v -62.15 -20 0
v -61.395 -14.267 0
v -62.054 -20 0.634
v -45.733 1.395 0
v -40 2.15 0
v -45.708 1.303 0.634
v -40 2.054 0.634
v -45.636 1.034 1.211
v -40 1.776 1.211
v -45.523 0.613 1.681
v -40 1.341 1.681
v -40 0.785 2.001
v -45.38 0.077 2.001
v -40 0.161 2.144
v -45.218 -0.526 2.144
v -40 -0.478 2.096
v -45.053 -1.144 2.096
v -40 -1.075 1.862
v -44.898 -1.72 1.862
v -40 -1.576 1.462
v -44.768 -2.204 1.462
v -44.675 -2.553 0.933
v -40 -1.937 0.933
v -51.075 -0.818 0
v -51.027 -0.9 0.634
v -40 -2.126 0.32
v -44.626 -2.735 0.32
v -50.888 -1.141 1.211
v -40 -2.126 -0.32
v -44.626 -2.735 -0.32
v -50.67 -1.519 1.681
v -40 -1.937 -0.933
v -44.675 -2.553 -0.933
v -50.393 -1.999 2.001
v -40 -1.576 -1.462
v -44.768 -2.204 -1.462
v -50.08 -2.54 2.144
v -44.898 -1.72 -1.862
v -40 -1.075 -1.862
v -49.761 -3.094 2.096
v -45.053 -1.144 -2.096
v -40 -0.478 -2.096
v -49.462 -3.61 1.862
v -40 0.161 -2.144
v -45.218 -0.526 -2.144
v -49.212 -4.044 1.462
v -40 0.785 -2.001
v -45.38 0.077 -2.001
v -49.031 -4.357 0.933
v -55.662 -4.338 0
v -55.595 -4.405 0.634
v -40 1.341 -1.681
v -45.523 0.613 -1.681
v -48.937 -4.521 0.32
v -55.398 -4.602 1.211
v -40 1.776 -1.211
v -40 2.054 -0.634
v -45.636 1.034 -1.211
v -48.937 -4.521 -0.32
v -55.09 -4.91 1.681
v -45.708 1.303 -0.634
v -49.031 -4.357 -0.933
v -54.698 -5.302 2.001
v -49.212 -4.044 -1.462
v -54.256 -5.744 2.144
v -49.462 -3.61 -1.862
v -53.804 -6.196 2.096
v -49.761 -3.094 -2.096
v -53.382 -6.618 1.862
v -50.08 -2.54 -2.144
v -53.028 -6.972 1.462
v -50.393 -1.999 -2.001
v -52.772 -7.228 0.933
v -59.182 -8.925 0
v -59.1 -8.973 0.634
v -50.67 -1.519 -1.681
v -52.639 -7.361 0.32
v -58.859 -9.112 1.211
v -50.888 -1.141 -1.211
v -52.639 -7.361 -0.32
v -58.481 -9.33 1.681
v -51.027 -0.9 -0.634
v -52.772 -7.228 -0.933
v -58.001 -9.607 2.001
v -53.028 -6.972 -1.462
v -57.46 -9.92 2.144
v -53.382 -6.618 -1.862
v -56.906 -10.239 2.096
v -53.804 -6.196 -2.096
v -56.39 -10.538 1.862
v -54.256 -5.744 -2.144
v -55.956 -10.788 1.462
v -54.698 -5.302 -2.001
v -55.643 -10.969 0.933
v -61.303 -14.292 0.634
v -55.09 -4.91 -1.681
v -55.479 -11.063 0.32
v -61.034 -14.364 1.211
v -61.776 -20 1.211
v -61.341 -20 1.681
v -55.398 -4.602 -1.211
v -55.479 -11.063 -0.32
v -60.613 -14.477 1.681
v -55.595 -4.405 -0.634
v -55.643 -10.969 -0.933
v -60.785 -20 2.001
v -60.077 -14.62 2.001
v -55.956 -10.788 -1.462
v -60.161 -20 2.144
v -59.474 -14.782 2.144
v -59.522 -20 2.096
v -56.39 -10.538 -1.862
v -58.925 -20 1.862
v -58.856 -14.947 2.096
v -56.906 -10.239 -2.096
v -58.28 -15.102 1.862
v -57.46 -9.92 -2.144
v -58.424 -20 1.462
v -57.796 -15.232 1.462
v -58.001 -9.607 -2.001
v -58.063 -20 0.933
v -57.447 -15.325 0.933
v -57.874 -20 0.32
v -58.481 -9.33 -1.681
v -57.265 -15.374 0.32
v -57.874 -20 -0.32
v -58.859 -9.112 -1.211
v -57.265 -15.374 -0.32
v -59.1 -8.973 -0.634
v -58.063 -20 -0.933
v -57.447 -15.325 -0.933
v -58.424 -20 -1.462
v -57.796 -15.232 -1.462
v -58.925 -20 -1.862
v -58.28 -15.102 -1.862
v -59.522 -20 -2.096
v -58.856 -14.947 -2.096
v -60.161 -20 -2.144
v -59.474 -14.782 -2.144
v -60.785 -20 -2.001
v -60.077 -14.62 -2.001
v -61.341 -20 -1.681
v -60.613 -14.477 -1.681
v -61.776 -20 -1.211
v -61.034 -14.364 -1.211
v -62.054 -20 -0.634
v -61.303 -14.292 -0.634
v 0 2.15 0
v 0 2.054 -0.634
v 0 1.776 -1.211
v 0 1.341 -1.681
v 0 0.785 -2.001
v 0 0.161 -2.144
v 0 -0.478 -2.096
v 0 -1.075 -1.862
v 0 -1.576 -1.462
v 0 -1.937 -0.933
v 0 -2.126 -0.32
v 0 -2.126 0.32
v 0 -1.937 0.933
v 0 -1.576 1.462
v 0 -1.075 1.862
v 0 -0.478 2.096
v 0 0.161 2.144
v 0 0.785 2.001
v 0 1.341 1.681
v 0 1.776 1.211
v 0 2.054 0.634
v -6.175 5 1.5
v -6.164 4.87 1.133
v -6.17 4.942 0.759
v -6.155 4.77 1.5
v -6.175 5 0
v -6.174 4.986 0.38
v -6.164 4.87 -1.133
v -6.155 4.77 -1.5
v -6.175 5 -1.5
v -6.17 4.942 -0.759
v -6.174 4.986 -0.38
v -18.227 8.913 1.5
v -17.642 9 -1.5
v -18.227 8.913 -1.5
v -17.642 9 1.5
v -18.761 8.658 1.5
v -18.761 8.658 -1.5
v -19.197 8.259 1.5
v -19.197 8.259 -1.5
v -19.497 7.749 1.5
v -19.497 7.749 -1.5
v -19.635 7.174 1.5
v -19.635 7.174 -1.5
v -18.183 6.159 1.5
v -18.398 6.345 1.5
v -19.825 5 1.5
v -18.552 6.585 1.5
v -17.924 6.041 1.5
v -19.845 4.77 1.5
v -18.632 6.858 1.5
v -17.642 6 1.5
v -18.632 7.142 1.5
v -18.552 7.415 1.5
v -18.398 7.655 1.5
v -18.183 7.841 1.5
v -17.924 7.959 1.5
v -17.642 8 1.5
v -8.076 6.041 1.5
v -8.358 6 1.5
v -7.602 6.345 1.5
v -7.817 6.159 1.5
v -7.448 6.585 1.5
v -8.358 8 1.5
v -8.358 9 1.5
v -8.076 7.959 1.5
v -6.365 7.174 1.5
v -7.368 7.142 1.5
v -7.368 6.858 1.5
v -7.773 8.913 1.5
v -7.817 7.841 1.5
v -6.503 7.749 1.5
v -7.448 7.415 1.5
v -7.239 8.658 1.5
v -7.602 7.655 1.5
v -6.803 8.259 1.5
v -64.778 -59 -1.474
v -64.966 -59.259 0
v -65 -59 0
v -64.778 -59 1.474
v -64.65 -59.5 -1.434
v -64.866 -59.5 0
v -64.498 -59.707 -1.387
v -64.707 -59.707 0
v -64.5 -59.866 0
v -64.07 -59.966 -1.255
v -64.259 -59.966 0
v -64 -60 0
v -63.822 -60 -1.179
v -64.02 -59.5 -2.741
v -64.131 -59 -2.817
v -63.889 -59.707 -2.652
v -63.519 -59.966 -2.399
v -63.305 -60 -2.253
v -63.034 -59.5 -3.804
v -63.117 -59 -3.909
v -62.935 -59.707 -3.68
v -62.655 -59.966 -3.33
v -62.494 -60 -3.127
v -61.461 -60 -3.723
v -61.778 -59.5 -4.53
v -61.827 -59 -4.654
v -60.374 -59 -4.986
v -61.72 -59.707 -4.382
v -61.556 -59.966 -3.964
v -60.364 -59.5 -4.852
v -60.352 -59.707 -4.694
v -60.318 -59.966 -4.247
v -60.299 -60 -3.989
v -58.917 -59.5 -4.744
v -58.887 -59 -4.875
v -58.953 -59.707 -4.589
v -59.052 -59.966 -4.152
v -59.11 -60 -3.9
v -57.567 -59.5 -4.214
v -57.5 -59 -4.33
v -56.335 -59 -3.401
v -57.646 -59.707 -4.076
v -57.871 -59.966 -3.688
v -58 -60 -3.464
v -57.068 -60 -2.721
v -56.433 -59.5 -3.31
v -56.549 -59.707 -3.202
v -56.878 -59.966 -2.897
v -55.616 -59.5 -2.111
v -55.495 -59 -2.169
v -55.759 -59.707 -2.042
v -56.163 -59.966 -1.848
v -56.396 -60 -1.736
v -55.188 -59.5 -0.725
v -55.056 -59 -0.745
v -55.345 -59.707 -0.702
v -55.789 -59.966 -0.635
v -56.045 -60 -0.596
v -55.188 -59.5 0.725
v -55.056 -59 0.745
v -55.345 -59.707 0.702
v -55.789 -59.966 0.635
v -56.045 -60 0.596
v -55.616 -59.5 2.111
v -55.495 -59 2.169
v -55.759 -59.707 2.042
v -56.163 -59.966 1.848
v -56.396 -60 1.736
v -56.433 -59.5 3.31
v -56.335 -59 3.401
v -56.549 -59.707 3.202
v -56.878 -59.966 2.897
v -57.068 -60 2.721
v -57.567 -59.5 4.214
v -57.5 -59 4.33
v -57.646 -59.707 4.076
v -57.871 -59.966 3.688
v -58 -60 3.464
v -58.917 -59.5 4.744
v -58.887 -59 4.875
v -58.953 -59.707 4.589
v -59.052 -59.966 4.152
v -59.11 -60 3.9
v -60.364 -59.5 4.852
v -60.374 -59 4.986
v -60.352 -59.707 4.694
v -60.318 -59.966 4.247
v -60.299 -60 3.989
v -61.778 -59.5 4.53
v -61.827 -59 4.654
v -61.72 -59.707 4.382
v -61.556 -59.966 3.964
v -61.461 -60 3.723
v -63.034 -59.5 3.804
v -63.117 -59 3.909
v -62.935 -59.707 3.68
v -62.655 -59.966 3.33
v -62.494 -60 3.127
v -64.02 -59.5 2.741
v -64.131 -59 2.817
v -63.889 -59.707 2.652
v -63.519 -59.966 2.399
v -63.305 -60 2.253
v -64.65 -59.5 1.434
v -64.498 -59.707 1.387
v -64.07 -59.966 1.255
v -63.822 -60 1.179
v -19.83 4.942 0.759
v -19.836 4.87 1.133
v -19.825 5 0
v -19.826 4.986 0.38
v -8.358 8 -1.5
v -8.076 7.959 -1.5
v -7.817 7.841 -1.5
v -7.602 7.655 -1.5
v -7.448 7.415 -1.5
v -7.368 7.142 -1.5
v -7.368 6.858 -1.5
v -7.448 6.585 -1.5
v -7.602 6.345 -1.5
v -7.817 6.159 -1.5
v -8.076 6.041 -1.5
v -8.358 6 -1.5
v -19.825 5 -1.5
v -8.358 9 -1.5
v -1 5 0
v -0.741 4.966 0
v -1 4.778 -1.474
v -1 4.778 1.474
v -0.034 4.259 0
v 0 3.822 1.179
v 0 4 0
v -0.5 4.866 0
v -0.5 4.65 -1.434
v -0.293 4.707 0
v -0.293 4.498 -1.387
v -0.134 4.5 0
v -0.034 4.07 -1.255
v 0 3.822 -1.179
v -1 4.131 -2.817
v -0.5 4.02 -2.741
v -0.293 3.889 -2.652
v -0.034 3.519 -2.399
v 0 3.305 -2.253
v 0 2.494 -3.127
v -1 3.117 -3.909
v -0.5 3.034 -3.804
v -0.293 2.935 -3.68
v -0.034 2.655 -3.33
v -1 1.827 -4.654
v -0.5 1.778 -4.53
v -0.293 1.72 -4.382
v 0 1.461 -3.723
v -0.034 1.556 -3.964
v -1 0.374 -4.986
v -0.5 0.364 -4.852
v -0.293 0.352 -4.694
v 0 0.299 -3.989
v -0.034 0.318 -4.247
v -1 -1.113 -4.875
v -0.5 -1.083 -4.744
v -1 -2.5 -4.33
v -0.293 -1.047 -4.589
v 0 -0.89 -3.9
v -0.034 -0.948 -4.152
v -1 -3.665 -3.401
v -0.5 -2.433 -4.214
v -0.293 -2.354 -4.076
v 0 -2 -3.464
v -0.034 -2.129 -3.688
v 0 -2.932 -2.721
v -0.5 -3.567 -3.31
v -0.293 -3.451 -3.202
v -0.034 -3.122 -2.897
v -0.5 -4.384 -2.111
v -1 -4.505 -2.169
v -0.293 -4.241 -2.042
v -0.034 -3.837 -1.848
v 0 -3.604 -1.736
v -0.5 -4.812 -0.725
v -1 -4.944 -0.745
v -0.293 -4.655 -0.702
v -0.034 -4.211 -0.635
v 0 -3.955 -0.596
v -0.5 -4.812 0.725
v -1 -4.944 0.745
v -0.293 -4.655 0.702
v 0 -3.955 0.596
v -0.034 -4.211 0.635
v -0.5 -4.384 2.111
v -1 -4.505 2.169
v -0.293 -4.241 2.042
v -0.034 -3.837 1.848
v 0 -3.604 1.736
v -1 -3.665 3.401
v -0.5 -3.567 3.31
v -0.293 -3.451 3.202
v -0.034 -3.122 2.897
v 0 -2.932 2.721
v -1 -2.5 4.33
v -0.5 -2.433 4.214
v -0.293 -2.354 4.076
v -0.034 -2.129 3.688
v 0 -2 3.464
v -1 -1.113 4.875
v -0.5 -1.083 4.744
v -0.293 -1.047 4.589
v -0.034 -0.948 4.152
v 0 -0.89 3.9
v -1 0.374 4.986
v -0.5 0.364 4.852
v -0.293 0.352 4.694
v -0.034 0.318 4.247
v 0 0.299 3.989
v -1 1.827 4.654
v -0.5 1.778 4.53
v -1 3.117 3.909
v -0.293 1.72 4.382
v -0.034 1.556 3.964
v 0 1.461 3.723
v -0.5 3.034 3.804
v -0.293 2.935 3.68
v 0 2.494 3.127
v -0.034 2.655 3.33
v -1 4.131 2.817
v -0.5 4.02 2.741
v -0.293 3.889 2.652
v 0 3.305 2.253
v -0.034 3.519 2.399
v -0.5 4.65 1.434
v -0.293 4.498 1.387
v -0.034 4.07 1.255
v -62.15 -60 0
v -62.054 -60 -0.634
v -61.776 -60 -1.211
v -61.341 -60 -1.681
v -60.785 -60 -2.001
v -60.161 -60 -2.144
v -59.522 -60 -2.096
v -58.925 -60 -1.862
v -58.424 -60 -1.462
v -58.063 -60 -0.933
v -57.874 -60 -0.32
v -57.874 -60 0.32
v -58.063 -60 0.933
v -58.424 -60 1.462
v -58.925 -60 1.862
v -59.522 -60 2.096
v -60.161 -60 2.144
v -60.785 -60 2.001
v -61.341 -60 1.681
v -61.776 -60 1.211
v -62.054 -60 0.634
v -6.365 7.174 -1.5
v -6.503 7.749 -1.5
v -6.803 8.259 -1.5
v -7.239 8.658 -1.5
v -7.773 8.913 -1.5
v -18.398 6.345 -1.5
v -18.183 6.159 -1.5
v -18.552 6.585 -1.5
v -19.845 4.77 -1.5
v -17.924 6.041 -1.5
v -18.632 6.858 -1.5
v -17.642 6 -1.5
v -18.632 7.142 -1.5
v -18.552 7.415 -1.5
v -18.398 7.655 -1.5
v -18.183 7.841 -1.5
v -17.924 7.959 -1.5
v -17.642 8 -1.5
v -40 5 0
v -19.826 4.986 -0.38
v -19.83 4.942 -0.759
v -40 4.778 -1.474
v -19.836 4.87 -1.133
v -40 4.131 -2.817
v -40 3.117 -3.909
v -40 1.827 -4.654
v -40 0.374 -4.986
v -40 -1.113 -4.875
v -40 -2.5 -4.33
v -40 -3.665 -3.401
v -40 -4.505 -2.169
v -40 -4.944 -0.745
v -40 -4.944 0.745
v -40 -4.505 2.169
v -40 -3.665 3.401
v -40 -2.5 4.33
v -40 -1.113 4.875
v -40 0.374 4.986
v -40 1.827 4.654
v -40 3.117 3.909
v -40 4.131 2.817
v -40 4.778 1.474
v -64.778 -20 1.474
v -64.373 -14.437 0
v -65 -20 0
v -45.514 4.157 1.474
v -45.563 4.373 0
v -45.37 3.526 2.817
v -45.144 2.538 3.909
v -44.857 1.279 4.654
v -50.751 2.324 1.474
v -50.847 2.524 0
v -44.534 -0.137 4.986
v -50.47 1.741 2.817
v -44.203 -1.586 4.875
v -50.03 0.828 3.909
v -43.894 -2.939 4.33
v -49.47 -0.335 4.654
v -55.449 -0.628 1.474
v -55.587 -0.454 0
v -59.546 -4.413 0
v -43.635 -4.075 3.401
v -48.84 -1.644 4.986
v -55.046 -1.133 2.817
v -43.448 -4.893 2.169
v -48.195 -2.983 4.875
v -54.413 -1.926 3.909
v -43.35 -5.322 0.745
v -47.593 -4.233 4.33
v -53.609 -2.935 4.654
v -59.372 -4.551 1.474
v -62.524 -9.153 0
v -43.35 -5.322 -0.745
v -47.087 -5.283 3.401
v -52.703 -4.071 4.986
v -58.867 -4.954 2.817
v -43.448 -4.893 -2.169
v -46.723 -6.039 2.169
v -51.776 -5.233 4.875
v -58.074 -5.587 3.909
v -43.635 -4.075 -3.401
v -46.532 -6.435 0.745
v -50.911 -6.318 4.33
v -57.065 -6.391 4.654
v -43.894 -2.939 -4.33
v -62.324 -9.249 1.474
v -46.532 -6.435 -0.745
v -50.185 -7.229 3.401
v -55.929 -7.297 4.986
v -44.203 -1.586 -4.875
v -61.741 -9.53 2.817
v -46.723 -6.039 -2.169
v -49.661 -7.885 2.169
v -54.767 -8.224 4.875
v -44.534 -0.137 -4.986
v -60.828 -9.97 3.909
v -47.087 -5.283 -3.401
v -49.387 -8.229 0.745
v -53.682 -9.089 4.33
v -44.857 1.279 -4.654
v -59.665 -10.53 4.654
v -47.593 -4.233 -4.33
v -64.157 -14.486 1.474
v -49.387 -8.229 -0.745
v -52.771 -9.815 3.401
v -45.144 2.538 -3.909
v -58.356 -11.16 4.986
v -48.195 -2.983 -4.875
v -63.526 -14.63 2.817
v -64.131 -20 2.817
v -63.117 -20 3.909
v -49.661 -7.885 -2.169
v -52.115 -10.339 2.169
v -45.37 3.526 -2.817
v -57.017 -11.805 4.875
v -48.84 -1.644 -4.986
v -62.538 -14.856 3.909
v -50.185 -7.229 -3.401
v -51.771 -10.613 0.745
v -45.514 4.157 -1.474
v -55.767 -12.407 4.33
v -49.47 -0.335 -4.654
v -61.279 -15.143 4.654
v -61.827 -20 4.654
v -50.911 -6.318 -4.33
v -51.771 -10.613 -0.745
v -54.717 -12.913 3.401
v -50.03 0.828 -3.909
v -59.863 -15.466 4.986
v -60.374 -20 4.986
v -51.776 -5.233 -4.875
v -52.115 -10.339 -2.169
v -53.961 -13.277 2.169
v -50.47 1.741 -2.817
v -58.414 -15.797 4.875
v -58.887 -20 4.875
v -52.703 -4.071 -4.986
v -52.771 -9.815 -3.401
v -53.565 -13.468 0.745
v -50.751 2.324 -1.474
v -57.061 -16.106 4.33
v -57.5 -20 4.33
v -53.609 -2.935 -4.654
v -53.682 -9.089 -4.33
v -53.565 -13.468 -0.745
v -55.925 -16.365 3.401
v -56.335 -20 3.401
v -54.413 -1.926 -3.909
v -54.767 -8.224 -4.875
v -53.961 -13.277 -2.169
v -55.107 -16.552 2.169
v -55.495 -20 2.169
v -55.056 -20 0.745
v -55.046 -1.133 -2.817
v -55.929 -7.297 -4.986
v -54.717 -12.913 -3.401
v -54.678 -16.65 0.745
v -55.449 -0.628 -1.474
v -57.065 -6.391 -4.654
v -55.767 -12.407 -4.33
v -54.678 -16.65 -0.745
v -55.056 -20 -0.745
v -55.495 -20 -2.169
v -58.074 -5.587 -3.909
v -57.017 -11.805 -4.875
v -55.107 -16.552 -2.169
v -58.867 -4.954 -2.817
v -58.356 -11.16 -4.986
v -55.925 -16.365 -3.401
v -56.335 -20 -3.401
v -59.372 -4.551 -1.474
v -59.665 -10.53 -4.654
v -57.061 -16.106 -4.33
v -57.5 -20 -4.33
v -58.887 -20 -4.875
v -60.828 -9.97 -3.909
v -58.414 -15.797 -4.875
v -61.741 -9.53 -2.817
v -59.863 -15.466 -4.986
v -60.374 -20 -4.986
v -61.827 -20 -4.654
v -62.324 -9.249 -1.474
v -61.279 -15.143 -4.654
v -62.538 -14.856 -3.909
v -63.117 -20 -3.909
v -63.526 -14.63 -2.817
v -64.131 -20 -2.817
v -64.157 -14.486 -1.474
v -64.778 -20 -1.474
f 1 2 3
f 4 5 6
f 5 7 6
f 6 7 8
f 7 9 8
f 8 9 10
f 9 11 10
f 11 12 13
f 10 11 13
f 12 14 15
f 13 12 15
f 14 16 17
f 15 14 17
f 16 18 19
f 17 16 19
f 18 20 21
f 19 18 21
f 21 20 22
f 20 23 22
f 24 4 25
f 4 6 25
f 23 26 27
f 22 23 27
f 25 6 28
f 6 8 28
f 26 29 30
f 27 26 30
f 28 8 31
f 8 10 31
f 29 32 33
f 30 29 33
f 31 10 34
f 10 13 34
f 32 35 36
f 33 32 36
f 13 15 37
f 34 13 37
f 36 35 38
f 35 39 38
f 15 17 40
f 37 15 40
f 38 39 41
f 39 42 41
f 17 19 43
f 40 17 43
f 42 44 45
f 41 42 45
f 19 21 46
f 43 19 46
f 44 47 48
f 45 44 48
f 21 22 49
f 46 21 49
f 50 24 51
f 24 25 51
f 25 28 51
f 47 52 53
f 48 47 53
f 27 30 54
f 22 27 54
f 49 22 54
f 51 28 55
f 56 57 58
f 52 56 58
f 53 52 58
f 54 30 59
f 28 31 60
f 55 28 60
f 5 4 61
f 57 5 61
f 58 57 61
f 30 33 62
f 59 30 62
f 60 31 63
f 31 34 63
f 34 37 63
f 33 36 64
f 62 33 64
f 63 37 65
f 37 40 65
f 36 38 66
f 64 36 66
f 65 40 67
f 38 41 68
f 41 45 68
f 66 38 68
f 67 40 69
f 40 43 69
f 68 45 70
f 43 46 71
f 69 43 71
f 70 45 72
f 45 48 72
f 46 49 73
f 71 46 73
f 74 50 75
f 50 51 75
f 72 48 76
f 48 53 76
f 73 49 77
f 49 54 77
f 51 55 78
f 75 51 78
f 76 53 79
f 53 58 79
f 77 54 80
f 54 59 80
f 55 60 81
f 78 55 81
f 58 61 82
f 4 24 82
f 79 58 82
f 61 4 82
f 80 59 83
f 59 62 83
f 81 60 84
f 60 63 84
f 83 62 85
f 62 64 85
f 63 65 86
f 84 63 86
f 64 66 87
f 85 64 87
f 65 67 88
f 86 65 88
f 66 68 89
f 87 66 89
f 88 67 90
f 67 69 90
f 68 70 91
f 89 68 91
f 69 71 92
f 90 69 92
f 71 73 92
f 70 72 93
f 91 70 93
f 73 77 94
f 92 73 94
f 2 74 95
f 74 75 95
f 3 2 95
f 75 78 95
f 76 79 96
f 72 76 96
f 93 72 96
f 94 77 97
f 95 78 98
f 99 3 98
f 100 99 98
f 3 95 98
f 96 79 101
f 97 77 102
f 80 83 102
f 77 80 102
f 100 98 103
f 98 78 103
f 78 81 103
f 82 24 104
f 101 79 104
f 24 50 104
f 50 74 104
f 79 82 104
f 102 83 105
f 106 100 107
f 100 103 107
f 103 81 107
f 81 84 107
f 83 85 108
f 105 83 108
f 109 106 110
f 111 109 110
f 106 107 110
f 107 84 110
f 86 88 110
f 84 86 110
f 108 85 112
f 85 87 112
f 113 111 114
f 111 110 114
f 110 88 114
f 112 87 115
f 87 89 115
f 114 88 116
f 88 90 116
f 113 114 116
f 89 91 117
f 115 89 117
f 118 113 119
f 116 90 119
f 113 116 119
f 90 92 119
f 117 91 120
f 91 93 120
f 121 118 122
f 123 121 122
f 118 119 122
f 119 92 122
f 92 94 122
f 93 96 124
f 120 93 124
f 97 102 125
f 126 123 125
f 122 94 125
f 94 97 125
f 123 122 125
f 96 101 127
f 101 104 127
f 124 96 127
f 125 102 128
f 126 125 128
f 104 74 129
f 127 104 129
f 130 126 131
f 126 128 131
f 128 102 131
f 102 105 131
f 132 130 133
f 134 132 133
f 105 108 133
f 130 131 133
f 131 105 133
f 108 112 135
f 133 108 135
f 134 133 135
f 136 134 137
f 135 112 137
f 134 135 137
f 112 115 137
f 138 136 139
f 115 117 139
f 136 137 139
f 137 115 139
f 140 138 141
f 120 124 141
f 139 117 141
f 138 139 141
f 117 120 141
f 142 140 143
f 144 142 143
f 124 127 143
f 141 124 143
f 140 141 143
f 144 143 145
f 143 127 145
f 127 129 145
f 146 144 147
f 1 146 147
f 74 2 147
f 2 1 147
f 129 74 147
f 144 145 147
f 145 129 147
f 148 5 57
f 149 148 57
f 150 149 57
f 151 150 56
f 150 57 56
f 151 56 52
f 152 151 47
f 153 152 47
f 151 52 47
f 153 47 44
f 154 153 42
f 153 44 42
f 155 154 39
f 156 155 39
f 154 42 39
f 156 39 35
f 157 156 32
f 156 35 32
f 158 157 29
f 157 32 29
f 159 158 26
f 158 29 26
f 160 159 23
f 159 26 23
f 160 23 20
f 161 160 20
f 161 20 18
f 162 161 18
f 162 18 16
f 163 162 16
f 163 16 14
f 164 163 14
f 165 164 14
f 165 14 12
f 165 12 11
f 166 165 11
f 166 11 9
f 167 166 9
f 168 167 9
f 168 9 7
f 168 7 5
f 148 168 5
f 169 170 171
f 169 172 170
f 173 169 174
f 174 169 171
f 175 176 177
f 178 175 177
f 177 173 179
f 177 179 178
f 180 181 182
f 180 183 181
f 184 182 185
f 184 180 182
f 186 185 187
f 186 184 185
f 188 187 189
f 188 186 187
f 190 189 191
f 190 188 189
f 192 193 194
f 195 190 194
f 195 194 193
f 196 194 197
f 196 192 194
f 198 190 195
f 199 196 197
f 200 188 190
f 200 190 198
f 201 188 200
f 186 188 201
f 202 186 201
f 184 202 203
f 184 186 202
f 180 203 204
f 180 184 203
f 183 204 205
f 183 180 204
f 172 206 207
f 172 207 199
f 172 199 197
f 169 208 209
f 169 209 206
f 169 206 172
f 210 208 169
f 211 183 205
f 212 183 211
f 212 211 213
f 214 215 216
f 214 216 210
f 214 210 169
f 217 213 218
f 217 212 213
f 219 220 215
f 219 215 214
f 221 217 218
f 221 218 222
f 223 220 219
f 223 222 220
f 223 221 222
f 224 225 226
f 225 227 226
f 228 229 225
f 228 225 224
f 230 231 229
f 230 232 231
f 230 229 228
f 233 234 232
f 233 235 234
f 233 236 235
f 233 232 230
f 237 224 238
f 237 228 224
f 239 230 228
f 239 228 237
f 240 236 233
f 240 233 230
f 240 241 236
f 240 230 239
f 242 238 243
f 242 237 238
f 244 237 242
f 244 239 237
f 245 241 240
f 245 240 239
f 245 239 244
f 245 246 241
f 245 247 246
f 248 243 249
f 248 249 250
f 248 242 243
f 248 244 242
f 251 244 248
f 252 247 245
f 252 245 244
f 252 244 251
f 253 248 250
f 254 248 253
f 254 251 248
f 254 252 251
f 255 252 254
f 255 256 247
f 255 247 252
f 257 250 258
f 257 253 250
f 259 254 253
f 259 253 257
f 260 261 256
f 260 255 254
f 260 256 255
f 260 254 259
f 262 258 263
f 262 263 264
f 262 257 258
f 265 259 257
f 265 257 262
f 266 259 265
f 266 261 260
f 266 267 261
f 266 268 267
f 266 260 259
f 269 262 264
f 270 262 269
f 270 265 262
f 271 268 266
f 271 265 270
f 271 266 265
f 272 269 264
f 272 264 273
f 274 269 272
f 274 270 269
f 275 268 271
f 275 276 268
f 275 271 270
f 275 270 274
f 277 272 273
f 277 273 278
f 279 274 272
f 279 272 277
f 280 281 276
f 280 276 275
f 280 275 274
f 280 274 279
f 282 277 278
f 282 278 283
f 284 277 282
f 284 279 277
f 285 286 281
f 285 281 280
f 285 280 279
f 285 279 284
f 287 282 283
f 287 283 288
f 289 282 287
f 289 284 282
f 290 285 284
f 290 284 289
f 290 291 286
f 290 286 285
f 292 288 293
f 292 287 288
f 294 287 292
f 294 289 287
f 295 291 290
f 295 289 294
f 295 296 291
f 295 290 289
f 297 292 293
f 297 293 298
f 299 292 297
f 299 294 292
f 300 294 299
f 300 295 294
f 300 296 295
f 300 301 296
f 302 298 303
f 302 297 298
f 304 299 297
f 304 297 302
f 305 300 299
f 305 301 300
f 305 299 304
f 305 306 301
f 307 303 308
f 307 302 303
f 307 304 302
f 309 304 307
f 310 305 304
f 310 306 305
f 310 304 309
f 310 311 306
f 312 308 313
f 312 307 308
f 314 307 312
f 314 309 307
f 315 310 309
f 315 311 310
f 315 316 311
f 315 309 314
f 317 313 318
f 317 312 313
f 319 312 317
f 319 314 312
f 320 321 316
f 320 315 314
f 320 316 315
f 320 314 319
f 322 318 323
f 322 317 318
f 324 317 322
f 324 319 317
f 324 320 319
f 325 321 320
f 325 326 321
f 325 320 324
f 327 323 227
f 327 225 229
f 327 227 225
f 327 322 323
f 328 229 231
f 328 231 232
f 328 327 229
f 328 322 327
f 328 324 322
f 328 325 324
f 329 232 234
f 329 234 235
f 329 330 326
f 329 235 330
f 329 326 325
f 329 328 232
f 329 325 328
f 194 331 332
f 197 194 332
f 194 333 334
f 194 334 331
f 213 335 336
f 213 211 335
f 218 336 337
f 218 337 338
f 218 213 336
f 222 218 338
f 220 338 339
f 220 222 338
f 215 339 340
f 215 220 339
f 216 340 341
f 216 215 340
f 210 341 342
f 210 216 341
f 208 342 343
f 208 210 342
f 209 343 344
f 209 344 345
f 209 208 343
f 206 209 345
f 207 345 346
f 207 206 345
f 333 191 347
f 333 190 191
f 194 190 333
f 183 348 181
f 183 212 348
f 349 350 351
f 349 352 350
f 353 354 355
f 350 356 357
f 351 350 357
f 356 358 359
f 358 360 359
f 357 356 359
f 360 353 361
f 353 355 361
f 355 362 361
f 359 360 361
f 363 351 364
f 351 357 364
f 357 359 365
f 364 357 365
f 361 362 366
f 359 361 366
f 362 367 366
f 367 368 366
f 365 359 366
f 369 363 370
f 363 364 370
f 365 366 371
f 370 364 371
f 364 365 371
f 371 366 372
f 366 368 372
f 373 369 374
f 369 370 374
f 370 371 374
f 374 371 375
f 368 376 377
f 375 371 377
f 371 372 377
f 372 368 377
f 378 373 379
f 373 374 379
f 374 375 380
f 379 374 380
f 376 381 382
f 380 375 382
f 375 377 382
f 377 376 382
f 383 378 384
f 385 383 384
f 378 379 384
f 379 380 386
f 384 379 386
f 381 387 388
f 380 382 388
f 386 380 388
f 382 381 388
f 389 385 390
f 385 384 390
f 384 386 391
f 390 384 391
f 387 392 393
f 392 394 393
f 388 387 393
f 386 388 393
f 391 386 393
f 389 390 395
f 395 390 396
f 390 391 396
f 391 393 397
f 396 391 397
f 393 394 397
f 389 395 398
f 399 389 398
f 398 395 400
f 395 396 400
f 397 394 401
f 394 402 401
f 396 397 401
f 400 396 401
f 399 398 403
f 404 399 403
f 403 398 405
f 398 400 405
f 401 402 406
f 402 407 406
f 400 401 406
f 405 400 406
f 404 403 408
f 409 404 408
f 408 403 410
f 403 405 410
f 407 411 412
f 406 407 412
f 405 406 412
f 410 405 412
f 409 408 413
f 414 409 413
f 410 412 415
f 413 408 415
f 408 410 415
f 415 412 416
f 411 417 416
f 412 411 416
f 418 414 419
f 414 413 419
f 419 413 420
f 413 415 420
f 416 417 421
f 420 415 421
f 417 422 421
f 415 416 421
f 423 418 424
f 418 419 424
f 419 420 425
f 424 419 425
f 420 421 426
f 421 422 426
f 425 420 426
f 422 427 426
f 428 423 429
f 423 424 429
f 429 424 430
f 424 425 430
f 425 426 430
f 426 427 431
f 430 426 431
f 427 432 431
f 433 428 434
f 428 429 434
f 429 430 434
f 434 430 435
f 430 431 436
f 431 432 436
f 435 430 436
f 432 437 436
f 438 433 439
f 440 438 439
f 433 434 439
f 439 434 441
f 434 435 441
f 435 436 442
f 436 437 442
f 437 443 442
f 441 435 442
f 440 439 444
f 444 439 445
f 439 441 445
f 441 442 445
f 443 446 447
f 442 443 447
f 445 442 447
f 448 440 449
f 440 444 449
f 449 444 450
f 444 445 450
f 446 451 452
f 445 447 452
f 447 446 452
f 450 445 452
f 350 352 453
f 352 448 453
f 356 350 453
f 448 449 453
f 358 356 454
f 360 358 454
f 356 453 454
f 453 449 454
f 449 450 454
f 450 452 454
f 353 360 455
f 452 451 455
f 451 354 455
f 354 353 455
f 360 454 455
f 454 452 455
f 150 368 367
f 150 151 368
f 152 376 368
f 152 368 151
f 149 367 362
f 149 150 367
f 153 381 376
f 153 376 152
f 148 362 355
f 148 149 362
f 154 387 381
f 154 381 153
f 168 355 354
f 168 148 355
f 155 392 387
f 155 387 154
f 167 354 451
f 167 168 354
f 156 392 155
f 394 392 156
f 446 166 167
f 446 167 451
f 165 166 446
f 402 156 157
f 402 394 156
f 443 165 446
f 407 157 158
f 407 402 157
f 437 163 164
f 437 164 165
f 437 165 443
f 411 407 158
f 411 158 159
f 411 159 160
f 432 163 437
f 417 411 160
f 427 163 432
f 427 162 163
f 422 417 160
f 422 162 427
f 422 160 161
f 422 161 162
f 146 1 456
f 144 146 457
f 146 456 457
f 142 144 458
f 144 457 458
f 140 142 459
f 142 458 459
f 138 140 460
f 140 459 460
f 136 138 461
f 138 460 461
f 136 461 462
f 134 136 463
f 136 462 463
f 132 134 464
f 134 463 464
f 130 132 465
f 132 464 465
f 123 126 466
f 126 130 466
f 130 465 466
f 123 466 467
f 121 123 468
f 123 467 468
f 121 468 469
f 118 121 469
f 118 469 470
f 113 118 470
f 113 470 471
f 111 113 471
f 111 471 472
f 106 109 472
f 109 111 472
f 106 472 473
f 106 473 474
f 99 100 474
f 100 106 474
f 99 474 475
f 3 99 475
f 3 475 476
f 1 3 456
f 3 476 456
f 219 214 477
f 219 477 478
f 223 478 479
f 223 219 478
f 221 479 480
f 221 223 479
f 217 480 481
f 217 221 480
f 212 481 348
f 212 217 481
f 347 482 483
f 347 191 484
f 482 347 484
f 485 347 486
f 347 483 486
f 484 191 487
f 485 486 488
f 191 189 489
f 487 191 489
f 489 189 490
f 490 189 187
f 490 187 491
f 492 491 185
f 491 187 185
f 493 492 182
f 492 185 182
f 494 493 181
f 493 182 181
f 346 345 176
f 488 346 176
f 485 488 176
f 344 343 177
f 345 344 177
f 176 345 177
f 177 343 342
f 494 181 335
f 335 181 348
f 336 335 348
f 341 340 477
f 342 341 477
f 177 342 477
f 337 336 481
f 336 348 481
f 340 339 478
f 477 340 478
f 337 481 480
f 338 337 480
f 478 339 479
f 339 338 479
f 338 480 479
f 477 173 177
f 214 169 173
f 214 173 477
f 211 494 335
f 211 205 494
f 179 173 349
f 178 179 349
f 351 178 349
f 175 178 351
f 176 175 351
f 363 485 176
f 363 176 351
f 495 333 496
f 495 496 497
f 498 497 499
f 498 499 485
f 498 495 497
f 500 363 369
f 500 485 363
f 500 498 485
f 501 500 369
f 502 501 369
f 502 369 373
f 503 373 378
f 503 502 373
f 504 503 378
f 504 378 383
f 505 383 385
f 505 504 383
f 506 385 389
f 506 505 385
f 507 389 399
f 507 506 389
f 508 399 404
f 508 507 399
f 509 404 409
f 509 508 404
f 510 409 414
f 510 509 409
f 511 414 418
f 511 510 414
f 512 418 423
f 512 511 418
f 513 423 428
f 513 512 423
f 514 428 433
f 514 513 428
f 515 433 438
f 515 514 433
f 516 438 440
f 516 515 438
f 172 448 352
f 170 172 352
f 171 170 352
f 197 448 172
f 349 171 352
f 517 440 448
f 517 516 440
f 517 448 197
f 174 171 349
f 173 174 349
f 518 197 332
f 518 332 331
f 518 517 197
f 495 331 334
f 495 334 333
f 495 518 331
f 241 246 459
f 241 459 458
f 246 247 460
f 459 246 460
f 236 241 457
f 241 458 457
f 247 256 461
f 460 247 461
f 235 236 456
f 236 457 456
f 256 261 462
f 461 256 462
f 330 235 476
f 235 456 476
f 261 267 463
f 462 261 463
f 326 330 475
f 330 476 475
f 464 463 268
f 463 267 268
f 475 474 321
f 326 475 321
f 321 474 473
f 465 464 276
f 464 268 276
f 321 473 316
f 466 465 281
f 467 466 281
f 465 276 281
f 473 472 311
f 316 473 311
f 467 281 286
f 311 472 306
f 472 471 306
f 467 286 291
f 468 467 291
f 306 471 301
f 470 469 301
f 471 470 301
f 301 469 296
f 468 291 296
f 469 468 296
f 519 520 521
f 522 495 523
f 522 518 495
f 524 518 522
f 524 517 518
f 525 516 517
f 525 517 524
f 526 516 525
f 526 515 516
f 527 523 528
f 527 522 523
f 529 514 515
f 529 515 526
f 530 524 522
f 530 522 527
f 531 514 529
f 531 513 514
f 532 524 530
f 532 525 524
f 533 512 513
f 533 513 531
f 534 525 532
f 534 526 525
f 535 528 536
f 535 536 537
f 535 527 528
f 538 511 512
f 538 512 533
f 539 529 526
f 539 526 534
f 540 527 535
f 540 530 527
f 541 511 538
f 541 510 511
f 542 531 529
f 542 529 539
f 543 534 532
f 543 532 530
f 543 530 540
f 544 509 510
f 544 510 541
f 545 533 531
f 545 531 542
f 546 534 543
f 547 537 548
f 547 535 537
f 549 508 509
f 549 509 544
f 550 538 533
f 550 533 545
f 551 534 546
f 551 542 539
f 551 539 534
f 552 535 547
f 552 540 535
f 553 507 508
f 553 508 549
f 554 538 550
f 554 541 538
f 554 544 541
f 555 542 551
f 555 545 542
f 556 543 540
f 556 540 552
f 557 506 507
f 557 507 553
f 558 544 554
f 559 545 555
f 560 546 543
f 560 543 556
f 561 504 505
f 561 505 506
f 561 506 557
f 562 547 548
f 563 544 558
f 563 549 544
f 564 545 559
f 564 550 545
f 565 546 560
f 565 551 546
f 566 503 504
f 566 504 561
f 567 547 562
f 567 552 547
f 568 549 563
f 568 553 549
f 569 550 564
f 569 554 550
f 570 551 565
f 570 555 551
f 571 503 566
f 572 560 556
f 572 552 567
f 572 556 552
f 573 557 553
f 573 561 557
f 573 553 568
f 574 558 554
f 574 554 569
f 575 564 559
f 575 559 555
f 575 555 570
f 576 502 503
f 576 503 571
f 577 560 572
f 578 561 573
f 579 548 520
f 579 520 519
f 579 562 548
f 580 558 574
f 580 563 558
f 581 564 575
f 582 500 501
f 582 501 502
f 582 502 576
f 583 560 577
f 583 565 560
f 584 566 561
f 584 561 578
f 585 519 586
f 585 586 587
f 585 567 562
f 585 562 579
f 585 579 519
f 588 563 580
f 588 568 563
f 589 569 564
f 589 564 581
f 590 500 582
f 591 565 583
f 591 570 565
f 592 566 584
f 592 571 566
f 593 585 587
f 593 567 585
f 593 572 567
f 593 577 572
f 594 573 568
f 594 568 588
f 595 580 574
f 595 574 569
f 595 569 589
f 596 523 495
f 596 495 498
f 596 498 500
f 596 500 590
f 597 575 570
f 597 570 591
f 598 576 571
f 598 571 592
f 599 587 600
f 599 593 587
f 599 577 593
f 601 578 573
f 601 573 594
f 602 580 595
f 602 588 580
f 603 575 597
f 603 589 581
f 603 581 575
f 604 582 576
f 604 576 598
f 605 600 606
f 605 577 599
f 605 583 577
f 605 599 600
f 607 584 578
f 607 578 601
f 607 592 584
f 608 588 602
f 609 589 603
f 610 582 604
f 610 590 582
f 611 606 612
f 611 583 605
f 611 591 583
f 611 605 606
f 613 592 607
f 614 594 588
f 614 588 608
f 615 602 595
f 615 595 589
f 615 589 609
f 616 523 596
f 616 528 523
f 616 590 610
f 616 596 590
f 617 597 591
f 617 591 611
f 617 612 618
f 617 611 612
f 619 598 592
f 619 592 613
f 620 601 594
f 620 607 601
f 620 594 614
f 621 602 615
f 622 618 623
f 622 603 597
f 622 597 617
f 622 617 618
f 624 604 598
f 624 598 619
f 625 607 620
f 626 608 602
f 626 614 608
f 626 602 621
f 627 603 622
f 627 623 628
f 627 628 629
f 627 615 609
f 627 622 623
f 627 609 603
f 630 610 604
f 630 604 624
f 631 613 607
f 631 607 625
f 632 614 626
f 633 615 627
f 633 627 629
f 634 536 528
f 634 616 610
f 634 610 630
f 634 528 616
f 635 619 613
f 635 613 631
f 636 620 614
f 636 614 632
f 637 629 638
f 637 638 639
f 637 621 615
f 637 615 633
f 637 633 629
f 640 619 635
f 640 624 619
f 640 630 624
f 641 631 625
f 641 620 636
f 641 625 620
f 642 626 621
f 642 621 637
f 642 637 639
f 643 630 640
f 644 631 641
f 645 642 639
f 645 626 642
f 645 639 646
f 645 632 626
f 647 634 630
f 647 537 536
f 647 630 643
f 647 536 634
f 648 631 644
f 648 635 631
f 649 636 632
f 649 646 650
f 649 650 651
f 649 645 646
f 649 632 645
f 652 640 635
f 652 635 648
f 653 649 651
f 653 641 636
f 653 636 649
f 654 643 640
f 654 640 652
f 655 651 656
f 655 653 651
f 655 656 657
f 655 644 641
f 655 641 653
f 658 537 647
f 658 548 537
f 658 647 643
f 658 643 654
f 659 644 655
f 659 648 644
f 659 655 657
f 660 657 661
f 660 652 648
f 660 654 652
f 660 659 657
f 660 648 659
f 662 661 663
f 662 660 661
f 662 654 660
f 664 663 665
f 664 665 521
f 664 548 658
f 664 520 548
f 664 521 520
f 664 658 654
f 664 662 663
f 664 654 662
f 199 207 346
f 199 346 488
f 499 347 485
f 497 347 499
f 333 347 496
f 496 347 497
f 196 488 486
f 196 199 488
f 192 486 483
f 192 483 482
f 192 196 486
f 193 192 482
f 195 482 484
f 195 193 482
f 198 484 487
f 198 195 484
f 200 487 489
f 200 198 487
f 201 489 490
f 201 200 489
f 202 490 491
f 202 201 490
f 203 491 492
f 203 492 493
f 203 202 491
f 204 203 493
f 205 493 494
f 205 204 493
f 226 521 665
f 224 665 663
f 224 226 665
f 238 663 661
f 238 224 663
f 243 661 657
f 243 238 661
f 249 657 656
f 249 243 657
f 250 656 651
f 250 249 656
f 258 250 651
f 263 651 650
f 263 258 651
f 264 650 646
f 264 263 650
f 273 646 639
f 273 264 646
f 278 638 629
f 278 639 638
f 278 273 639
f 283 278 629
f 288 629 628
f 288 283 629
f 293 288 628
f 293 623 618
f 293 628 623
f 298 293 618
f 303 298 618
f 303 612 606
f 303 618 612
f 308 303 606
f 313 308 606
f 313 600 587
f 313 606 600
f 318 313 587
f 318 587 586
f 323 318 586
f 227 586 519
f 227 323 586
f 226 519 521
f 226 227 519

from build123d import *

# Parameters (mm, degrees)
F1_R     = 5
F1_R_2   = 2.15
F3_R     = 1
F5_DEPTH = 1.5


with BuildPart() as f2:
    # F2: sweep along a path in F0
    with BuildLine(Plane.XY) as f2_path:
        Line((0, 0), (-40, 0))
        ThreePointArc((-40, 0), (-54.1421356237, -5.8578643763), (-60, -20))
        Line((-60, -20), (-60, -60))
    # F1 (on Right) → F2 (sweep)
    with BuildSketch(Plane.YZ):
        Circle(F1_R)
        Circle(F1_R_2, mode=Mode.SUBTRACT)
    sweep(path=f2_path.line)

    # F3
    f3_edges = [f2.edges().sort_by_distance(p)[0] for p in [
        (-55, -60, 0),
        (0, -5, 0),
    ]]
    fillet(f3_edges, radius=F3_R)

    # F4 (on Top) → F5 (join, symmetric)
    with BuildSketch(Plane.XY):
        Polygon((-19.8250226729, 5), (-20, 3), (-6, 3), (-6.1749773271, 5), align=None)
        with BuildLine():
            Line((-19.634795067, 7.1743114855), (-19.8250226729, 5))
            Line((-19.8250226729, 5), (-6.1749773271, 5))
            Line((-6.1749773271, 5), (-6.365204933, 7.1743114855))
            ThreePointArc((-6.365204933, 7.1743114855), (-7.006413914, 8.4745546736), (-8.3575943292, 9))
            Line((-8.3575943292, 9), (-17.6424056708, 9))
            ThreePointArc((-17.6424056708, 9), (-18.993586086, 8.4745546736), (-19.634795067, 7.1743114855))
        make_face()
        with BuildLine():
            Line((-8.3575943292, 6), (-17.6424056708, 6))
            ThreePointArc((-17.6424056708, 6), (-18.6424056708, 7), (-17.6424056708, 8))
            Line((-17.6424056708, 8), (-8.3575943292, 8))
            ThreePointArc((-8.3575943292, 8), (-7.3575943292, 7), (-8.3575943292, 6))
        make_face(mode=Mode.SUBTRACT)
    extrude(amount=F5_DEPTH, both=True)


solid = f2.part
